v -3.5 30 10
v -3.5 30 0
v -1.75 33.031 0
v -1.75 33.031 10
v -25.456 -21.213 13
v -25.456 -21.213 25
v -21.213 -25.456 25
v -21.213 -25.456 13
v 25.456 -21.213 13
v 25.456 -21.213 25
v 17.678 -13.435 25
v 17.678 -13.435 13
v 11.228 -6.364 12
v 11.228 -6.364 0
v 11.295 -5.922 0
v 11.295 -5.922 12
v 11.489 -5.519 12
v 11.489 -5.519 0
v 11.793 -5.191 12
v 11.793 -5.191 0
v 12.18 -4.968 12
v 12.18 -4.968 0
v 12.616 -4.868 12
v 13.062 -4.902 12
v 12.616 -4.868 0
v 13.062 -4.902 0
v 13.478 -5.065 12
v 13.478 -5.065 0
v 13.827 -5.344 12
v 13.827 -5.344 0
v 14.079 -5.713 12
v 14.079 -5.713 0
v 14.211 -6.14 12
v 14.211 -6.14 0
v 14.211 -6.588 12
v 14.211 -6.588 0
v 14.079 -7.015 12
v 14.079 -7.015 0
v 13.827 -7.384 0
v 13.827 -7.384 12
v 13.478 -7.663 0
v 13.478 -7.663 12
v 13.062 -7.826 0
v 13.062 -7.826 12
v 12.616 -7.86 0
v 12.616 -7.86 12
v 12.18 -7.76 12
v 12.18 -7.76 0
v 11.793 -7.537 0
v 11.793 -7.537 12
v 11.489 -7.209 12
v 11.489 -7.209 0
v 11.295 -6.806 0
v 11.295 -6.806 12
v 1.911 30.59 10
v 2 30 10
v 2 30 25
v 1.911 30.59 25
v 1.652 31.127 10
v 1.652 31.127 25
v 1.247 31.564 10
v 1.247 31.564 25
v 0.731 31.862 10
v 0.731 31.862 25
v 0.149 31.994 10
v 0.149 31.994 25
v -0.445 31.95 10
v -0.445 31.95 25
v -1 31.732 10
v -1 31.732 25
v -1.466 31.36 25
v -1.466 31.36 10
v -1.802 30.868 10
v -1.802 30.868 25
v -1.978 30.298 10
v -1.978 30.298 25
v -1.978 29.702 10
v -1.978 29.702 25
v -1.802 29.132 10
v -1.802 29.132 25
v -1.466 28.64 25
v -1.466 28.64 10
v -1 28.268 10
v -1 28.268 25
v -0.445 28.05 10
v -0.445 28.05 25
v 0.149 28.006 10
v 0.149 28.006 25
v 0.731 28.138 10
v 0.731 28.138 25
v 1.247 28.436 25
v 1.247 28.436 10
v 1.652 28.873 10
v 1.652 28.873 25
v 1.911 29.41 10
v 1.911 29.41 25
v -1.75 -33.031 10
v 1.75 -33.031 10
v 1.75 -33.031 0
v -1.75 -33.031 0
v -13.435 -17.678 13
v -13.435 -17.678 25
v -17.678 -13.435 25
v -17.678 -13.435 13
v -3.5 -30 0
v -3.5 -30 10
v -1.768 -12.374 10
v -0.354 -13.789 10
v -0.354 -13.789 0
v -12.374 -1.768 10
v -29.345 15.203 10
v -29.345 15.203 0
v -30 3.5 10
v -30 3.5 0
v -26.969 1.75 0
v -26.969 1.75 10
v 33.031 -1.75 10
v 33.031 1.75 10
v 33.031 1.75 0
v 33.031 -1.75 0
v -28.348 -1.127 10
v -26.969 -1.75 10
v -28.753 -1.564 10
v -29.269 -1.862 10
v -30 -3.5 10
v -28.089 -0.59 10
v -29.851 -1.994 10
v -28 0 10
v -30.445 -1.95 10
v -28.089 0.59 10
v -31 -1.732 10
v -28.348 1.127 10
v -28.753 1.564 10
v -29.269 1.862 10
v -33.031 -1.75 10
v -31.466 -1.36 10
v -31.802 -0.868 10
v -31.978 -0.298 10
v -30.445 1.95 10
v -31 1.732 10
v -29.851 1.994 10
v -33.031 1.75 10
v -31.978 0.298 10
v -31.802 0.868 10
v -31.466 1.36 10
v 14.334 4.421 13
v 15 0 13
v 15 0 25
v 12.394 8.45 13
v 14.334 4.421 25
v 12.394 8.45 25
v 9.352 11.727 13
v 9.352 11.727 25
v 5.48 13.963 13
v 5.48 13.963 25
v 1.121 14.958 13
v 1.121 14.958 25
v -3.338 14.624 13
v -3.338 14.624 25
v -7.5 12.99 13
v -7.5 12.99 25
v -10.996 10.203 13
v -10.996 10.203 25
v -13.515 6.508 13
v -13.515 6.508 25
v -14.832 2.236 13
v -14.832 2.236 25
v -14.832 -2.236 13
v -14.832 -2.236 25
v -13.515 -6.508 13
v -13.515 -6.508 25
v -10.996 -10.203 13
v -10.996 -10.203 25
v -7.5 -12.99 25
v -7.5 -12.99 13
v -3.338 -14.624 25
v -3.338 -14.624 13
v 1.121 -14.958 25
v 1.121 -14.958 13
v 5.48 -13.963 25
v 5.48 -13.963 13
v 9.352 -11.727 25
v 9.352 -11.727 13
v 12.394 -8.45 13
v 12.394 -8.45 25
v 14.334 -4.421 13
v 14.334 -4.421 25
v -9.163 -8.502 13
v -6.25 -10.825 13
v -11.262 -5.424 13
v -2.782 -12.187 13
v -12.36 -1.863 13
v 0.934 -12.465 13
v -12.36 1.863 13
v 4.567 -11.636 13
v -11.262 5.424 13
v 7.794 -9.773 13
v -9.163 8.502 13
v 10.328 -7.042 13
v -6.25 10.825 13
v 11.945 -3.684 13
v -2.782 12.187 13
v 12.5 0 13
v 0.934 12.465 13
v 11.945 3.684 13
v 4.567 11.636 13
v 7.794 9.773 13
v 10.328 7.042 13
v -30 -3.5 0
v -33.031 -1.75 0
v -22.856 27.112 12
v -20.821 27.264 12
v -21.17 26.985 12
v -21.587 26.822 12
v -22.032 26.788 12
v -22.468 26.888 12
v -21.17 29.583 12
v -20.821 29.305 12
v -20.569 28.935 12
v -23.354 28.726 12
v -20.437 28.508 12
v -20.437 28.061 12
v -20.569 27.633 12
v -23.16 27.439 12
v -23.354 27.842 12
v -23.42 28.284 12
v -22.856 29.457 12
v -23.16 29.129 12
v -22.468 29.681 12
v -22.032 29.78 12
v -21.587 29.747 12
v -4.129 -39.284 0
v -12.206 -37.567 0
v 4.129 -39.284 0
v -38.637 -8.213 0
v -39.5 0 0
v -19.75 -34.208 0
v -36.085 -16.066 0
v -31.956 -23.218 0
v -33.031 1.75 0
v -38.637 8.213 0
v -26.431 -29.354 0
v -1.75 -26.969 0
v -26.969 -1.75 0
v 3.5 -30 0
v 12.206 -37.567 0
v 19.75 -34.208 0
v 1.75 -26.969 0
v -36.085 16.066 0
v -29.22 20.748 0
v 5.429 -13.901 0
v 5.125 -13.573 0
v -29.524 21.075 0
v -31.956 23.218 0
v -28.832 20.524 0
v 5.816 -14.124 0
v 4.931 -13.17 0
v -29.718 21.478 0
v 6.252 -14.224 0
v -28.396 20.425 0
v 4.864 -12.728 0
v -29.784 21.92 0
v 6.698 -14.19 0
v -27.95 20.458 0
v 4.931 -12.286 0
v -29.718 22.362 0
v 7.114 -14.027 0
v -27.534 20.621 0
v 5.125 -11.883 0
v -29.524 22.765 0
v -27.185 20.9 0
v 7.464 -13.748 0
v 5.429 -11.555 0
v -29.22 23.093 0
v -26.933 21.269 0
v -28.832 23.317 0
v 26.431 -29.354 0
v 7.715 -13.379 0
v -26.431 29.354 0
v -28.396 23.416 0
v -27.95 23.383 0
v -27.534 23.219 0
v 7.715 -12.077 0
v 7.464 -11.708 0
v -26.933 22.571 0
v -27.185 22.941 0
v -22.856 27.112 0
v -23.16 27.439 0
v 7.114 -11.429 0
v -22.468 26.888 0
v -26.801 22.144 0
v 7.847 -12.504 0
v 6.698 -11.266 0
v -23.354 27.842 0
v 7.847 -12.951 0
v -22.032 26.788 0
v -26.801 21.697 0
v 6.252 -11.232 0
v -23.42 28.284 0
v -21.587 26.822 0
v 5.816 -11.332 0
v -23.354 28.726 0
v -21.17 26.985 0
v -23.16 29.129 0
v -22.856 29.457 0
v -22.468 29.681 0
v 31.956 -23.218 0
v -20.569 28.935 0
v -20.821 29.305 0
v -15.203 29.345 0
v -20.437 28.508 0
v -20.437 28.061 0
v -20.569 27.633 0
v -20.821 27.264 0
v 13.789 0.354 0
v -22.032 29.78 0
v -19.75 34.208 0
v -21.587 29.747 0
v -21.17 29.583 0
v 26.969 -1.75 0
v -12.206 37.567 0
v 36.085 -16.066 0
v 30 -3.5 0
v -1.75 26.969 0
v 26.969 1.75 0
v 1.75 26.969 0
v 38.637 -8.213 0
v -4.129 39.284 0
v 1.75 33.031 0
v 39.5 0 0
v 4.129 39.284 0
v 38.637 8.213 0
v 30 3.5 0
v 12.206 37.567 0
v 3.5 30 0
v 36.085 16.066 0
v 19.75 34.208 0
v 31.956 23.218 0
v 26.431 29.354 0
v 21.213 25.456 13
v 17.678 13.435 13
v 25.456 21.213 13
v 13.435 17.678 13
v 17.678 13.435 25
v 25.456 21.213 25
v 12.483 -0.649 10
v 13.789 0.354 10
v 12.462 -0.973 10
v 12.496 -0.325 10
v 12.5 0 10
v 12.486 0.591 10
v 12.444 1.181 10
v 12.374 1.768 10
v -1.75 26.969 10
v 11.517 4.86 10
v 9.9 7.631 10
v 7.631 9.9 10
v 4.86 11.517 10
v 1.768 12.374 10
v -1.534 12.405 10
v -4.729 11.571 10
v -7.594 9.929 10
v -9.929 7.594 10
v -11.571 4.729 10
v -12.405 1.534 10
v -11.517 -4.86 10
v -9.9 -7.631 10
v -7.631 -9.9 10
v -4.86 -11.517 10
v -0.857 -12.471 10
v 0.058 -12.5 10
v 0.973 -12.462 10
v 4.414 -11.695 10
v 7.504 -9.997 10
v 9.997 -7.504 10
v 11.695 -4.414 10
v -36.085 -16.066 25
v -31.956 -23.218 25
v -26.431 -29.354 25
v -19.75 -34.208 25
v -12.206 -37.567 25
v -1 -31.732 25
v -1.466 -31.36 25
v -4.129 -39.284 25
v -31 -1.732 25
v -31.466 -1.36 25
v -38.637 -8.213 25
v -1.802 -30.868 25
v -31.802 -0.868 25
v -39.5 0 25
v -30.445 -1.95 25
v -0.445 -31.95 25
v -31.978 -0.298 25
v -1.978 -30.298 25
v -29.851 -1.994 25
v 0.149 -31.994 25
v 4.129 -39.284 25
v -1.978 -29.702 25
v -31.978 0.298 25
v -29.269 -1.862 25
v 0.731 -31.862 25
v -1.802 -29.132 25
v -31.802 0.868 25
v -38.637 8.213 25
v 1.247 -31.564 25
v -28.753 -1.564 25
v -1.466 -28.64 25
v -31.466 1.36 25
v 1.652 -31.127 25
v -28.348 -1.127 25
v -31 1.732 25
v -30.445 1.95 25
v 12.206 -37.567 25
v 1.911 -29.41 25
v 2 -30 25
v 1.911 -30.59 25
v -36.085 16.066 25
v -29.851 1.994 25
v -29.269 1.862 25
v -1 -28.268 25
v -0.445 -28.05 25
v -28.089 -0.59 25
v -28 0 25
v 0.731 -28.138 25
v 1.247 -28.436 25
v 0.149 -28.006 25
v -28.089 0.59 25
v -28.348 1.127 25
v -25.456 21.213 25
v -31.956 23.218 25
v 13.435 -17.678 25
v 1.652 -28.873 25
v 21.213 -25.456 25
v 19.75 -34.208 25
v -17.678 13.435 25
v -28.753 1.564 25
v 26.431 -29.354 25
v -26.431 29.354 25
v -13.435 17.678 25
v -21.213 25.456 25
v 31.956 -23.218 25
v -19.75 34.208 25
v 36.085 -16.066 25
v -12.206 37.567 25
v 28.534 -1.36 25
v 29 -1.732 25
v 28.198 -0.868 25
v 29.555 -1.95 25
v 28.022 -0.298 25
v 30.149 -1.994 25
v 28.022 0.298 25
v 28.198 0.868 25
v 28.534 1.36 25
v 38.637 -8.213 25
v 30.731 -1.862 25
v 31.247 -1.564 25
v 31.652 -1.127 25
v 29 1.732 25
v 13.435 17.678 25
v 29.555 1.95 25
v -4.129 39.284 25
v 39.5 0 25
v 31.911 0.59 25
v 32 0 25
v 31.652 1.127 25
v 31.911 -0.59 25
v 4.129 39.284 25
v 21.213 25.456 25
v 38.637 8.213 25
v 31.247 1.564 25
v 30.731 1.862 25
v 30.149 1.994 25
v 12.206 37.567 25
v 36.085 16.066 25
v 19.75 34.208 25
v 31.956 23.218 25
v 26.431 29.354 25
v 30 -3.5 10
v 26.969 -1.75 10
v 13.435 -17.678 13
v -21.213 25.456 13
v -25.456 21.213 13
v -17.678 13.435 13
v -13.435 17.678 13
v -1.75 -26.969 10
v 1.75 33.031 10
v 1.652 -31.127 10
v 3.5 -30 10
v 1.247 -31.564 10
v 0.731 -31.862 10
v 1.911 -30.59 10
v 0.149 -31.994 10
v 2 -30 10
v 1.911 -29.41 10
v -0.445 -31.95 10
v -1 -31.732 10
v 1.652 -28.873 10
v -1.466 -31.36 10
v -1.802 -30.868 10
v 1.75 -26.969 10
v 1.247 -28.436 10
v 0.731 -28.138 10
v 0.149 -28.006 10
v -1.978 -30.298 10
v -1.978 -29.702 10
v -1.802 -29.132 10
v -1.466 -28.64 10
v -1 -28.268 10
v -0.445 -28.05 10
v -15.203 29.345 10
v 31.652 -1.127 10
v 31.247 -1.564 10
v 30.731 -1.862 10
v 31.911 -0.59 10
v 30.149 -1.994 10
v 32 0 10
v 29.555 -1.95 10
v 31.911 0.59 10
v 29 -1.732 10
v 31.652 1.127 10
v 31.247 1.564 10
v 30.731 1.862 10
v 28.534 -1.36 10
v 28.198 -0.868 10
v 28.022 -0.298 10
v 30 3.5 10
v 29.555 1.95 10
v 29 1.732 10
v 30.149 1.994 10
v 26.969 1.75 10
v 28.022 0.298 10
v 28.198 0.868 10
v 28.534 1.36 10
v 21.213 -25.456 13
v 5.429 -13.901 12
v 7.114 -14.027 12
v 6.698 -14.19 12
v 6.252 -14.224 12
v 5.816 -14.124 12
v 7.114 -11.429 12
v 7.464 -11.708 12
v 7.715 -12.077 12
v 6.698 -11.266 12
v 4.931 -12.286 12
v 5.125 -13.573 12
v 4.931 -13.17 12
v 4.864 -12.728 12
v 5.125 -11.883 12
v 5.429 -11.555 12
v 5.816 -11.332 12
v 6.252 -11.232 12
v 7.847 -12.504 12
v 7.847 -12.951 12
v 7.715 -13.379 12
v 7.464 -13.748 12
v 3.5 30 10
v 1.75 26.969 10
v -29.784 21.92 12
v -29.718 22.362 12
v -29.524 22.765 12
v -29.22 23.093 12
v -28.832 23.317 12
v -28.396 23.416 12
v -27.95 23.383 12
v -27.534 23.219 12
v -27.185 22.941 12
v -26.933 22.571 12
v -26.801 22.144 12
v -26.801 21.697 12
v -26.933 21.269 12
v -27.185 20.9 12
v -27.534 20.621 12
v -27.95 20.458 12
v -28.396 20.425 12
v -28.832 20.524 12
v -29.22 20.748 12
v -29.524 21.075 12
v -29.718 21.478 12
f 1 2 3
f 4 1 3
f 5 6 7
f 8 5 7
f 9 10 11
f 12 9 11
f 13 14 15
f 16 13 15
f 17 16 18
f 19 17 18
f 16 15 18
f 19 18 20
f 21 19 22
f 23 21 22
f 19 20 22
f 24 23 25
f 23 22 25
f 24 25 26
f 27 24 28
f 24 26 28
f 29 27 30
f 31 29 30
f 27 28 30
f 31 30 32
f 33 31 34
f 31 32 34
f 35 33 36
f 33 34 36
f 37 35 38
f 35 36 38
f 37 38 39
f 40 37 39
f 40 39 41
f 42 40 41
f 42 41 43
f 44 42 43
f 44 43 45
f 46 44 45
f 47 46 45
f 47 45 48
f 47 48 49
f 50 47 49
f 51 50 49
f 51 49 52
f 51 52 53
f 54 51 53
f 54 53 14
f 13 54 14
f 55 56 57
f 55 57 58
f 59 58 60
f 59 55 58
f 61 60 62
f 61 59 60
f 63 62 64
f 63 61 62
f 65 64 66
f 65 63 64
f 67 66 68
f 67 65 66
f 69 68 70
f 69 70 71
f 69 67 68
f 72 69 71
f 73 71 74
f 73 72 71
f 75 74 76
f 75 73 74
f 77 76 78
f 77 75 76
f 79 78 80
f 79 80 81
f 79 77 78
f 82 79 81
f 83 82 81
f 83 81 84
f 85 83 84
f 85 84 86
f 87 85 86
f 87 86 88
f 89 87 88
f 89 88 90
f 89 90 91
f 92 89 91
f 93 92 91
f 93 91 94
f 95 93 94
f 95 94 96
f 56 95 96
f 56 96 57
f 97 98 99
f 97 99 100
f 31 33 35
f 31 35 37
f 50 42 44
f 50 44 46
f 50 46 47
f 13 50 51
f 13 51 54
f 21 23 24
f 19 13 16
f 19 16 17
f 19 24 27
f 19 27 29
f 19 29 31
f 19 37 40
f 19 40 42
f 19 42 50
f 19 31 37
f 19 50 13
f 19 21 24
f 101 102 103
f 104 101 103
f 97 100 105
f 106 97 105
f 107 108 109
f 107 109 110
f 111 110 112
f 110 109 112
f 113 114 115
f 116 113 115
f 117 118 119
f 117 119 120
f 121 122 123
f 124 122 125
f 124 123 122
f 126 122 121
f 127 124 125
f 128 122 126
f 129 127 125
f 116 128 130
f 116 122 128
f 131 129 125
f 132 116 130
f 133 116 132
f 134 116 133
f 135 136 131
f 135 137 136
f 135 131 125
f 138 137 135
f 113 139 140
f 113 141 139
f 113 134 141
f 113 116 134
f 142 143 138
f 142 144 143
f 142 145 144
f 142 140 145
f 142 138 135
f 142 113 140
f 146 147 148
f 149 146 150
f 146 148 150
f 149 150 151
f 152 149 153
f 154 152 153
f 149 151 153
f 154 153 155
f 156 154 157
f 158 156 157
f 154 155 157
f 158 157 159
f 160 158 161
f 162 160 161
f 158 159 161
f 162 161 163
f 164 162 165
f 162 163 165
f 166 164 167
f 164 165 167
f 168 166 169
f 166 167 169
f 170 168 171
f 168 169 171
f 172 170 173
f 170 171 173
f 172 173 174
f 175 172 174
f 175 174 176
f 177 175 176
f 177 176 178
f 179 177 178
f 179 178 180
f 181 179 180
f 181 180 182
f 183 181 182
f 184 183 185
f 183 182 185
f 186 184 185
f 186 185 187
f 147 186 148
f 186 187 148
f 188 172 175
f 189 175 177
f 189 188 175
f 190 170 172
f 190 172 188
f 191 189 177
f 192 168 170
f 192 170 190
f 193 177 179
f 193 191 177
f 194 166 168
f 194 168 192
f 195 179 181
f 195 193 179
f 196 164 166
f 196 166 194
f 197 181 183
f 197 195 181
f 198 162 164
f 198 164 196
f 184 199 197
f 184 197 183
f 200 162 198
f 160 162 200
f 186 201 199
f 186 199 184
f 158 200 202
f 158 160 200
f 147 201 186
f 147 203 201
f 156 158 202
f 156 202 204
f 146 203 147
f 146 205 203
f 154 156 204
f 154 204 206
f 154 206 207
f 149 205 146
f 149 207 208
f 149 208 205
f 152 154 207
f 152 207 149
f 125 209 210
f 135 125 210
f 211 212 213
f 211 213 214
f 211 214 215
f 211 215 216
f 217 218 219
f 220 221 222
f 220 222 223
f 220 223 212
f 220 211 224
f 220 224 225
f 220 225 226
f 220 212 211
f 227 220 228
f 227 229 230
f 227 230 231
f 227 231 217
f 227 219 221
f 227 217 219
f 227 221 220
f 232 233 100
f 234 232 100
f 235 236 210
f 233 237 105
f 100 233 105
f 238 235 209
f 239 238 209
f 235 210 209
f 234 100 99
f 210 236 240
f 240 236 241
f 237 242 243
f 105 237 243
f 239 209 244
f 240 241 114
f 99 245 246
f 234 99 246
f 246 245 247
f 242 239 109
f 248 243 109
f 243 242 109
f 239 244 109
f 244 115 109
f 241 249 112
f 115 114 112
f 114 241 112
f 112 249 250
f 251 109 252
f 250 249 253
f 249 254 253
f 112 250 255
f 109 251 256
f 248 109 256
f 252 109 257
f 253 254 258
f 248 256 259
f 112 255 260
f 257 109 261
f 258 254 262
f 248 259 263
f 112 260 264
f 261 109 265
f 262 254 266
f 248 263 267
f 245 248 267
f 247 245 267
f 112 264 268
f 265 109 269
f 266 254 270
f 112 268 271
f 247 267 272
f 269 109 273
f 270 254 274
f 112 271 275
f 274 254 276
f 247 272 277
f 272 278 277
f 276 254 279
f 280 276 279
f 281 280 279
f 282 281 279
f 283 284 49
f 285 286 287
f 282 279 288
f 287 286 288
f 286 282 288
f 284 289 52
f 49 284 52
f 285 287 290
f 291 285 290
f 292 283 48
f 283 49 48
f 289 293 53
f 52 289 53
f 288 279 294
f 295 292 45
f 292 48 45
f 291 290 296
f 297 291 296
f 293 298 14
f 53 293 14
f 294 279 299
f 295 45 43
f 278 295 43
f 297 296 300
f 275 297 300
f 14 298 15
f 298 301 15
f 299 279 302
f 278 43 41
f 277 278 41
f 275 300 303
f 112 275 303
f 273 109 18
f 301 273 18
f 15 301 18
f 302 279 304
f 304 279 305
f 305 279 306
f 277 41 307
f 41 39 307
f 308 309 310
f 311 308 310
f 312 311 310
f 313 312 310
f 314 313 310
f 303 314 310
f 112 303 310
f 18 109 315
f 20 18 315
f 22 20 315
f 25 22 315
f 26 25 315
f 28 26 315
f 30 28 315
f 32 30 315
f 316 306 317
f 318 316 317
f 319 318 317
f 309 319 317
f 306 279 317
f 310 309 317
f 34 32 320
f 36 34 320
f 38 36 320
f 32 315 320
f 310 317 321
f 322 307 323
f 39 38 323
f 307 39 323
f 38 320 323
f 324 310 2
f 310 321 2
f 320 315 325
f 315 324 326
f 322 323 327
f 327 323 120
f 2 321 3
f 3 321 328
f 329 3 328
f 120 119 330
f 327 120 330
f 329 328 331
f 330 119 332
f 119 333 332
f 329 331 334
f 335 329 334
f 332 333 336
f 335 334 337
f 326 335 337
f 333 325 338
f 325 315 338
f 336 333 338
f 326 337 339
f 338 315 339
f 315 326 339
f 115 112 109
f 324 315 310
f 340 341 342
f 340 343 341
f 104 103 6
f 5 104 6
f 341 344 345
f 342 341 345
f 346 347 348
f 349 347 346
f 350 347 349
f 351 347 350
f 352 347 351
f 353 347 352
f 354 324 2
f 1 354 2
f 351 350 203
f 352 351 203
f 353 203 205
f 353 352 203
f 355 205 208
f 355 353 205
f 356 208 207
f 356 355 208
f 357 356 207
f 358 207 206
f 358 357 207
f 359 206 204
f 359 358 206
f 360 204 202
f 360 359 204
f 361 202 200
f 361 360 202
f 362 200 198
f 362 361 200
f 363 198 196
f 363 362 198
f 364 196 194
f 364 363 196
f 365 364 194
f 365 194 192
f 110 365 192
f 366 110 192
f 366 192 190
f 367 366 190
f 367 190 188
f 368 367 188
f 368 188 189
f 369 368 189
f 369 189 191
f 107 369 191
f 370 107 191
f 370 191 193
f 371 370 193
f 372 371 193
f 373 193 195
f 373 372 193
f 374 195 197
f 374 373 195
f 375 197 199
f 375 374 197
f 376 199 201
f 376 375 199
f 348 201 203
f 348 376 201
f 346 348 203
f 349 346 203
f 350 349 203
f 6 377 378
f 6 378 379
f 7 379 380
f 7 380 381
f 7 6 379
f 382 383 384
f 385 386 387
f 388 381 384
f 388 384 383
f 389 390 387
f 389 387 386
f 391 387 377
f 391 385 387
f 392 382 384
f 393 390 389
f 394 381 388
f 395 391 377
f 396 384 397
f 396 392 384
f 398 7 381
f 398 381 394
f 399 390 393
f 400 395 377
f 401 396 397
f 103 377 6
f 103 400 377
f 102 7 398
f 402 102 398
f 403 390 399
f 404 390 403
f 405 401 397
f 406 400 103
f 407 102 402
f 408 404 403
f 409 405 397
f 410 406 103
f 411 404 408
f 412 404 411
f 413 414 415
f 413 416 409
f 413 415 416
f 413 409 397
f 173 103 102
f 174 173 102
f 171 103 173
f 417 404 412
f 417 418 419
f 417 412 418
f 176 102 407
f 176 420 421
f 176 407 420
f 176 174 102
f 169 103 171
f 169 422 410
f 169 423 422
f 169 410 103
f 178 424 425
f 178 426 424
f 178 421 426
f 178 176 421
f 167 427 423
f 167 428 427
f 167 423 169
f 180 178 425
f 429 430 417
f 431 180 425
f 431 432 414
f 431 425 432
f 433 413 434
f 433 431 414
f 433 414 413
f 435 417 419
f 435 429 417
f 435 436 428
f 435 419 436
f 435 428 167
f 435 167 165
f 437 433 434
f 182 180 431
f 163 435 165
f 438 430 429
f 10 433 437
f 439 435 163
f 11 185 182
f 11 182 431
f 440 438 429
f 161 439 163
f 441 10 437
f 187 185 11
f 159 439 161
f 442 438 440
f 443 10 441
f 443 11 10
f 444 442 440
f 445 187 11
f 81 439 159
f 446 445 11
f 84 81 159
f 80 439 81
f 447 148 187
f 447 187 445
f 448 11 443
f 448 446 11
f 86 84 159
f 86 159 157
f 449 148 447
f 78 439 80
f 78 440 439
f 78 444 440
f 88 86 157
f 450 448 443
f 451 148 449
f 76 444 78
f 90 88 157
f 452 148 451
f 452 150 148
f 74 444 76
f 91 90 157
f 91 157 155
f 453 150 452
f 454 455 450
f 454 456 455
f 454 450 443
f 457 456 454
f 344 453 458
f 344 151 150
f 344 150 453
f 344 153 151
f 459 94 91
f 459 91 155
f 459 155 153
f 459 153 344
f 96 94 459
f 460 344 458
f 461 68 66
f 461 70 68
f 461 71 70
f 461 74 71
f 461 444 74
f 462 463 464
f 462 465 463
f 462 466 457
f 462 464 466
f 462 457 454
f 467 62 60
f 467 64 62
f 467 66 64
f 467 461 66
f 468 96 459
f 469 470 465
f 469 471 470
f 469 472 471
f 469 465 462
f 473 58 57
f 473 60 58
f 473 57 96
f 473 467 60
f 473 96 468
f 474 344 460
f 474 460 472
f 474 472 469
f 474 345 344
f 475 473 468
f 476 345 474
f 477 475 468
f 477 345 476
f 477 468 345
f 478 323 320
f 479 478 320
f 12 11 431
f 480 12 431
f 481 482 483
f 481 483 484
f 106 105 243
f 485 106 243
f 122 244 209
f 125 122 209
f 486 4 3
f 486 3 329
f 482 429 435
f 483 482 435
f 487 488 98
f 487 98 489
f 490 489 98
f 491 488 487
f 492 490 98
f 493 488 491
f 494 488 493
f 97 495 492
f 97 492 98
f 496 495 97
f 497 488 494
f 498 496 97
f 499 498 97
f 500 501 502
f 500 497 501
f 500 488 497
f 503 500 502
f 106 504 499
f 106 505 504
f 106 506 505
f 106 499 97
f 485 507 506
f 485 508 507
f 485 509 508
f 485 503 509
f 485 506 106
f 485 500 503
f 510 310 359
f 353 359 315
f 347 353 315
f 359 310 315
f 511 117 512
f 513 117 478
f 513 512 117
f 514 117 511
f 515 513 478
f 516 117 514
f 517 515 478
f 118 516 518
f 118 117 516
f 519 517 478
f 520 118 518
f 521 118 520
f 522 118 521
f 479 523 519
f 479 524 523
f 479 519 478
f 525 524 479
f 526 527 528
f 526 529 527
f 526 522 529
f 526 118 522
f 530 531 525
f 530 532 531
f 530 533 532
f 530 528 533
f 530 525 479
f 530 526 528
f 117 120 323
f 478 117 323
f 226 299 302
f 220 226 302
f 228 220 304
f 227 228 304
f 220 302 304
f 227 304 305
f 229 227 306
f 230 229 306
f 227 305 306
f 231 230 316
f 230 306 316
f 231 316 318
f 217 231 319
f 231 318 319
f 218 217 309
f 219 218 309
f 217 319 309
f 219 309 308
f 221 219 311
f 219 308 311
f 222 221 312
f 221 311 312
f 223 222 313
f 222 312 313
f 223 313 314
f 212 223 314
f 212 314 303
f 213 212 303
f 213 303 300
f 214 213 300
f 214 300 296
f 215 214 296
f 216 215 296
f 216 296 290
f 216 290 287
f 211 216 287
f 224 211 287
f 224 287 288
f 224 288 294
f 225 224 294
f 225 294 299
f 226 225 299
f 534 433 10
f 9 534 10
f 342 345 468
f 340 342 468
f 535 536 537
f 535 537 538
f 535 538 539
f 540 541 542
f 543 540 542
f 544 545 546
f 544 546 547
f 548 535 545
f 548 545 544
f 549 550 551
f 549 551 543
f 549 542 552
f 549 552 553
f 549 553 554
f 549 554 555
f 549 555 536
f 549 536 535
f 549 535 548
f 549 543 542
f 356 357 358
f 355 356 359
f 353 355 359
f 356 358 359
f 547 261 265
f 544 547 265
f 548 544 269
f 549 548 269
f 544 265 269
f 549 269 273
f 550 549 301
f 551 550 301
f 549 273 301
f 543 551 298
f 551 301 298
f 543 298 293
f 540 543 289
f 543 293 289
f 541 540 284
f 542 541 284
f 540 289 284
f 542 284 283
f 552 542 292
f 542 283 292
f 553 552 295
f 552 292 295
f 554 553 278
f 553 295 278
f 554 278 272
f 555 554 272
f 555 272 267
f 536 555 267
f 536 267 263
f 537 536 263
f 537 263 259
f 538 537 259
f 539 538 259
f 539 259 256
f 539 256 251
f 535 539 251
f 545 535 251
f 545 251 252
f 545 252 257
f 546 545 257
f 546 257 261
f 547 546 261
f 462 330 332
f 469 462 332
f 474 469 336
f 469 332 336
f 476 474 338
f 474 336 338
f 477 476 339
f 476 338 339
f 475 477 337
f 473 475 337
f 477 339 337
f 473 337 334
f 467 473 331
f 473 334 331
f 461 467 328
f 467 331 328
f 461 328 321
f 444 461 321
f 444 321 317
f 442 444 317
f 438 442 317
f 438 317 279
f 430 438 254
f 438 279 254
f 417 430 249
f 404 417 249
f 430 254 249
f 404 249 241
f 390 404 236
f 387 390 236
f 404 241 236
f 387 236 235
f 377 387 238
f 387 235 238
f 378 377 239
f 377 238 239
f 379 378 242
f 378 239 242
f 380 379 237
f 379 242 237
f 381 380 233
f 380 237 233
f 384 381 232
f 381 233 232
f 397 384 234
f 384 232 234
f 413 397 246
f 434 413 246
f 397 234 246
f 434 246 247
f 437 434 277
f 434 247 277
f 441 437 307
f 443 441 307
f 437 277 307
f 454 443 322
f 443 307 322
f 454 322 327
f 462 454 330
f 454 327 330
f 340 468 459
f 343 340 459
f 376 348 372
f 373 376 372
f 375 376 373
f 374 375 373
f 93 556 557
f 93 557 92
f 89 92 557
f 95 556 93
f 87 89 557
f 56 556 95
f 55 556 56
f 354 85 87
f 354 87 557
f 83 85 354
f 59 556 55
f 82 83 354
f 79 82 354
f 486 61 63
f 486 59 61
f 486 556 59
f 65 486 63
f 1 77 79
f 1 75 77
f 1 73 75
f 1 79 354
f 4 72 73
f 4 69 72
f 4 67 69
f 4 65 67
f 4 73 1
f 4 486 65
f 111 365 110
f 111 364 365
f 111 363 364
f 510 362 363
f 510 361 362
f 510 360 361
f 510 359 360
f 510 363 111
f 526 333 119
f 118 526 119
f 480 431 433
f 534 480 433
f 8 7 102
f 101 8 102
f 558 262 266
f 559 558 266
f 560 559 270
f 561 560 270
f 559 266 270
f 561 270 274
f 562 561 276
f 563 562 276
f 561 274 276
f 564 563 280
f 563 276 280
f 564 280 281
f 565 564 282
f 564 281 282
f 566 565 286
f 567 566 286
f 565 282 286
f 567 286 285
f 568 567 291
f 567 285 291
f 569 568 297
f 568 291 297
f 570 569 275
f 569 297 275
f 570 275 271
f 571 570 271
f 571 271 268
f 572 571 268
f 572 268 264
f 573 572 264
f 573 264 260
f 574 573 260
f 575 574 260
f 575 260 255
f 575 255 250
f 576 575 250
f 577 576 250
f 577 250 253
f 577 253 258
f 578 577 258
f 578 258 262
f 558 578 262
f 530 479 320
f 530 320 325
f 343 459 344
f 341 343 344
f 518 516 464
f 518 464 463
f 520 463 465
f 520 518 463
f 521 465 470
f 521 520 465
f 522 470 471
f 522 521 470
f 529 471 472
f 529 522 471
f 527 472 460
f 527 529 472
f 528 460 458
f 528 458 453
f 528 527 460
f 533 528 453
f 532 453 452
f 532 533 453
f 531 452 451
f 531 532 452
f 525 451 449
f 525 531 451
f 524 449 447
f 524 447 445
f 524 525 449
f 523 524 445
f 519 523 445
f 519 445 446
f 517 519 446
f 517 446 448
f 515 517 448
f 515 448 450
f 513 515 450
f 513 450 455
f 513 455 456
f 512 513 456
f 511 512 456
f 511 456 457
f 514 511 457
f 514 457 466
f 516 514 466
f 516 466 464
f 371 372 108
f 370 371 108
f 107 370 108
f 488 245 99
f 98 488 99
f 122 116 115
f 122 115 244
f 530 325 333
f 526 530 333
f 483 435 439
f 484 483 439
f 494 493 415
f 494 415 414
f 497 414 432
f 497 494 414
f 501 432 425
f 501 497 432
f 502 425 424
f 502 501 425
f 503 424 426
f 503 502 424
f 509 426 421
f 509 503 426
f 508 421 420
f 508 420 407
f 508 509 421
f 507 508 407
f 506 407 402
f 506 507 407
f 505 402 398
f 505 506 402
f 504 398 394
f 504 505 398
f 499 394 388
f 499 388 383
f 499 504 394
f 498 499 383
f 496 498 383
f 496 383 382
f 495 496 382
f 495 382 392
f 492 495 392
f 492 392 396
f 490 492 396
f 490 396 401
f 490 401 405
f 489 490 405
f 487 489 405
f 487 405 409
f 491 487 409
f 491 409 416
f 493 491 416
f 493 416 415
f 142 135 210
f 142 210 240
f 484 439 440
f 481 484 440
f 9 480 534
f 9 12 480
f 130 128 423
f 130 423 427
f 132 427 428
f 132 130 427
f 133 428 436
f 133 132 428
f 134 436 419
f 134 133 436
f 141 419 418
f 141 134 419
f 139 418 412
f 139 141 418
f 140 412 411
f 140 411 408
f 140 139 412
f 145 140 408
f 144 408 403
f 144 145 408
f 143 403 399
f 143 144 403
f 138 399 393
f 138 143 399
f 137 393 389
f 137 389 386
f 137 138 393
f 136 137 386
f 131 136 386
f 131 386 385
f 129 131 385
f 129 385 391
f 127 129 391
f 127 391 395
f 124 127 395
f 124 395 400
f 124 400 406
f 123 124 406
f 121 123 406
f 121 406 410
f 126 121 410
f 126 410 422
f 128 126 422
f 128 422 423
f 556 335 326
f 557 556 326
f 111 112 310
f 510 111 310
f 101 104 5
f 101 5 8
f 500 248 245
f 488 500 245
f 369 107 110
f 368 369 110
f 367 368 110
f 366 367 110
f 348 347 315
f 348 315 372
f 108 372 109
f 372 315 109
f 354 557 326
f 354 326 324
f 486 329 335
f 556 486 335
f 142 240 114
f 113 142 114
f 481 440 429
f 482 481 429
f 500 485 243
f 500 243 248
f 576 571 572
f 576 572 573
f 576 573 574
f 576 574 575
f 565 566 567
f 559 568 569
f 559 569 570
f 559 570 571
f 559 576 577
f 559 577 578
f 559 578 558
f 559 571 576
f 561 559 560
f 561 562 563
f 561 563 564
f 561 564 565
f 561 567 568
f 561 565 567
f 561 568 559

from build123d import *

# Parameters (mm, degrees)
CROQUIS1_R              = 39.5
CROQUIS1_R_2            = 12.5
CROQUIS1_R_3            = 2
SALIENTE_EXTRUIR1_DEPTH = 25
CROQUIS3_R              = 15
CORTAR_EXTRUIR1_DEPTH   = 12
CROQUIS5_R              = 16.857920318
SALIENTE_EXTRUIR2_DEPTH = 10
CROQUIS4_R              = 1.5
CORTAR_EXTRUIR2_DEPTH   = 10
CROQUIS6_R              = 1.5
CORTAR_EXTRUIR3_DEPTH   = 12


with BuildPart() as part:
    # Croquis1 → Saliente-Extruir1 (new body)
    with BuildSketch(Plane.XY):
        Circle(CROQUIS1_R)
        Circle(CROQUIS1_R_2, mode=Mode.SUBTRACT)
        with Locations((0, 30)):
            Circle(CROQUIS1_R_3, mode=Mode.SUBTRACT)
        with Locations((30, 0)):
            Circle(CROQUIS1_R_3, mode=Mode.SUBTRACT)
        with Locations((0, -30)):
            Circle(CROQUIS1_R_3, mode=Mode.SUBTRACT)
        with Locations((-30, 0)):
            Circle(CROQUIS1_R_3, mode=Mode.SUBTRACT)
    extrude(amount=SALIENTE_EXTRUIR1_DEPTH)

    # Croquis3 → Cortar-Extruir1 (cut)
    with BuildSketch(Plane.XY.offset(25)):
        Circle(CROQUIS3_R)
        Polygon((17.67766953, 13.435028843), (25.455844123, 21.213203436), (21.213203436, 25.455844123), (13.435028843, 17.67766953), align=None)
        Polygon((13.435028843, -17.67766953), (21.213203436, -25.455844123), (25.455844123, -21.213203436), (17.67766953, -13.435028843), align=None)
        Polygon((-17.67766953, -13.435028843), (-25.455844123, -21.213203436), (-21.213203436, -25.455844123), (-13.435028843, -17.67766953), align=None)
        Polygon((-13.435028843, 17.67766953), (-21.213203436, 25.455844123), (-25.455844123, 21.213203436), (-17.67766953, 13.435028843), align=None)
    extrude(amount=-CORTAR_EXTRUIR1_DEPTH, mode=Mode.SUBTRACT)

    # Croquis5 → Saliente-Extruir2 (add)
    with BuildSketch(Plane(origin=(0, 0, 0), x_dir=(-1, 0, 0), z_dir=(0, 0, -1))):
        Circle(CROQUIS5_R)
    extrude(amount=-SALIENTE_EXTRUIR2_DEPTH)

    # Croquis4 → Cortar-Extruir2 (cut)
    with BuildSketch(Plane(origin=(0, 0, 0), x_dir=(-1, 0, 0), z_dir=(0, 0, -1))):
        with Locations((-12.727922061, -6.363961031)):
            Circle(CROQUIS4_R)
        with Locations((-6.363961031, -12.727922061)):
            Circle(CROQUIS4_R)
        with Locations((21.920310217, 28.284271247)):
            Circle(CROQUIS4_R)
        with Locations((28.284271247, 21.920310217)):
            Circle(CROQUIS4_R)
        Polygon((30, -3.5), (33.031088913, -1.75), (33.031088913, 1.75), (30, 3.5), (26.968911087, 1.75), (26.968911087, -1.75), align=None)
        Polygon((3.5, 30), (1.75, 33.031088913), (-1.75, 33.031088913), (-3.5, 30), (-1.75, 26.968911087), (1.75, 26.968911087), align=None)
        Polygon((-3.5, -30), (-1.75, -33.031088913), (1.75, -33.031088913), (3.5, -30), (1.75, -26.968911087), (-1.75, -26.968911087), align=None)
        Polygon((-30, 3.5), (-33.031088913, 1.75), (-33.031088913, -1.75), (-30, -3.5), (-26.968911087, -1.75), (-26.968911087, 1.75), align=None)
        Polygon((0.353553391, -13.788582233), (29.344931419, 15.202795796), (15.202795796, 29.344931419), (-13.788582233, 0.353553391), align=None)
    extrude(amount=-CORTAR_EXTRUIR2_DEPTH, mode=Mode.SUBTRACT)

    # Croquis6 → Cortar-Extruir3 (cut)
    with BuildSketch(Plane(origin=(0, 0, 0), x_dir=(-1, 0, 0), z_dir=(0, 0, -1))):
        with Locations((-12.727922061, -6.363961031)):
            Circle(CROQUIS6_R)
        with Locations((-6.363961031, -12.727922061)):
            Circle(CROQUIS6_R)
        with Locations((21.920310217, 28.284271247)):
            Circle(CROQUIS6_R)
        with Locations((28.284271247, 21.920310217)):
            Circle(CROQUIS6_R)
    extrude(amount=-CORTAR_EXTRUIR3_DEPTH, mode=Mode.SUBTRACT)


solid = part.part
